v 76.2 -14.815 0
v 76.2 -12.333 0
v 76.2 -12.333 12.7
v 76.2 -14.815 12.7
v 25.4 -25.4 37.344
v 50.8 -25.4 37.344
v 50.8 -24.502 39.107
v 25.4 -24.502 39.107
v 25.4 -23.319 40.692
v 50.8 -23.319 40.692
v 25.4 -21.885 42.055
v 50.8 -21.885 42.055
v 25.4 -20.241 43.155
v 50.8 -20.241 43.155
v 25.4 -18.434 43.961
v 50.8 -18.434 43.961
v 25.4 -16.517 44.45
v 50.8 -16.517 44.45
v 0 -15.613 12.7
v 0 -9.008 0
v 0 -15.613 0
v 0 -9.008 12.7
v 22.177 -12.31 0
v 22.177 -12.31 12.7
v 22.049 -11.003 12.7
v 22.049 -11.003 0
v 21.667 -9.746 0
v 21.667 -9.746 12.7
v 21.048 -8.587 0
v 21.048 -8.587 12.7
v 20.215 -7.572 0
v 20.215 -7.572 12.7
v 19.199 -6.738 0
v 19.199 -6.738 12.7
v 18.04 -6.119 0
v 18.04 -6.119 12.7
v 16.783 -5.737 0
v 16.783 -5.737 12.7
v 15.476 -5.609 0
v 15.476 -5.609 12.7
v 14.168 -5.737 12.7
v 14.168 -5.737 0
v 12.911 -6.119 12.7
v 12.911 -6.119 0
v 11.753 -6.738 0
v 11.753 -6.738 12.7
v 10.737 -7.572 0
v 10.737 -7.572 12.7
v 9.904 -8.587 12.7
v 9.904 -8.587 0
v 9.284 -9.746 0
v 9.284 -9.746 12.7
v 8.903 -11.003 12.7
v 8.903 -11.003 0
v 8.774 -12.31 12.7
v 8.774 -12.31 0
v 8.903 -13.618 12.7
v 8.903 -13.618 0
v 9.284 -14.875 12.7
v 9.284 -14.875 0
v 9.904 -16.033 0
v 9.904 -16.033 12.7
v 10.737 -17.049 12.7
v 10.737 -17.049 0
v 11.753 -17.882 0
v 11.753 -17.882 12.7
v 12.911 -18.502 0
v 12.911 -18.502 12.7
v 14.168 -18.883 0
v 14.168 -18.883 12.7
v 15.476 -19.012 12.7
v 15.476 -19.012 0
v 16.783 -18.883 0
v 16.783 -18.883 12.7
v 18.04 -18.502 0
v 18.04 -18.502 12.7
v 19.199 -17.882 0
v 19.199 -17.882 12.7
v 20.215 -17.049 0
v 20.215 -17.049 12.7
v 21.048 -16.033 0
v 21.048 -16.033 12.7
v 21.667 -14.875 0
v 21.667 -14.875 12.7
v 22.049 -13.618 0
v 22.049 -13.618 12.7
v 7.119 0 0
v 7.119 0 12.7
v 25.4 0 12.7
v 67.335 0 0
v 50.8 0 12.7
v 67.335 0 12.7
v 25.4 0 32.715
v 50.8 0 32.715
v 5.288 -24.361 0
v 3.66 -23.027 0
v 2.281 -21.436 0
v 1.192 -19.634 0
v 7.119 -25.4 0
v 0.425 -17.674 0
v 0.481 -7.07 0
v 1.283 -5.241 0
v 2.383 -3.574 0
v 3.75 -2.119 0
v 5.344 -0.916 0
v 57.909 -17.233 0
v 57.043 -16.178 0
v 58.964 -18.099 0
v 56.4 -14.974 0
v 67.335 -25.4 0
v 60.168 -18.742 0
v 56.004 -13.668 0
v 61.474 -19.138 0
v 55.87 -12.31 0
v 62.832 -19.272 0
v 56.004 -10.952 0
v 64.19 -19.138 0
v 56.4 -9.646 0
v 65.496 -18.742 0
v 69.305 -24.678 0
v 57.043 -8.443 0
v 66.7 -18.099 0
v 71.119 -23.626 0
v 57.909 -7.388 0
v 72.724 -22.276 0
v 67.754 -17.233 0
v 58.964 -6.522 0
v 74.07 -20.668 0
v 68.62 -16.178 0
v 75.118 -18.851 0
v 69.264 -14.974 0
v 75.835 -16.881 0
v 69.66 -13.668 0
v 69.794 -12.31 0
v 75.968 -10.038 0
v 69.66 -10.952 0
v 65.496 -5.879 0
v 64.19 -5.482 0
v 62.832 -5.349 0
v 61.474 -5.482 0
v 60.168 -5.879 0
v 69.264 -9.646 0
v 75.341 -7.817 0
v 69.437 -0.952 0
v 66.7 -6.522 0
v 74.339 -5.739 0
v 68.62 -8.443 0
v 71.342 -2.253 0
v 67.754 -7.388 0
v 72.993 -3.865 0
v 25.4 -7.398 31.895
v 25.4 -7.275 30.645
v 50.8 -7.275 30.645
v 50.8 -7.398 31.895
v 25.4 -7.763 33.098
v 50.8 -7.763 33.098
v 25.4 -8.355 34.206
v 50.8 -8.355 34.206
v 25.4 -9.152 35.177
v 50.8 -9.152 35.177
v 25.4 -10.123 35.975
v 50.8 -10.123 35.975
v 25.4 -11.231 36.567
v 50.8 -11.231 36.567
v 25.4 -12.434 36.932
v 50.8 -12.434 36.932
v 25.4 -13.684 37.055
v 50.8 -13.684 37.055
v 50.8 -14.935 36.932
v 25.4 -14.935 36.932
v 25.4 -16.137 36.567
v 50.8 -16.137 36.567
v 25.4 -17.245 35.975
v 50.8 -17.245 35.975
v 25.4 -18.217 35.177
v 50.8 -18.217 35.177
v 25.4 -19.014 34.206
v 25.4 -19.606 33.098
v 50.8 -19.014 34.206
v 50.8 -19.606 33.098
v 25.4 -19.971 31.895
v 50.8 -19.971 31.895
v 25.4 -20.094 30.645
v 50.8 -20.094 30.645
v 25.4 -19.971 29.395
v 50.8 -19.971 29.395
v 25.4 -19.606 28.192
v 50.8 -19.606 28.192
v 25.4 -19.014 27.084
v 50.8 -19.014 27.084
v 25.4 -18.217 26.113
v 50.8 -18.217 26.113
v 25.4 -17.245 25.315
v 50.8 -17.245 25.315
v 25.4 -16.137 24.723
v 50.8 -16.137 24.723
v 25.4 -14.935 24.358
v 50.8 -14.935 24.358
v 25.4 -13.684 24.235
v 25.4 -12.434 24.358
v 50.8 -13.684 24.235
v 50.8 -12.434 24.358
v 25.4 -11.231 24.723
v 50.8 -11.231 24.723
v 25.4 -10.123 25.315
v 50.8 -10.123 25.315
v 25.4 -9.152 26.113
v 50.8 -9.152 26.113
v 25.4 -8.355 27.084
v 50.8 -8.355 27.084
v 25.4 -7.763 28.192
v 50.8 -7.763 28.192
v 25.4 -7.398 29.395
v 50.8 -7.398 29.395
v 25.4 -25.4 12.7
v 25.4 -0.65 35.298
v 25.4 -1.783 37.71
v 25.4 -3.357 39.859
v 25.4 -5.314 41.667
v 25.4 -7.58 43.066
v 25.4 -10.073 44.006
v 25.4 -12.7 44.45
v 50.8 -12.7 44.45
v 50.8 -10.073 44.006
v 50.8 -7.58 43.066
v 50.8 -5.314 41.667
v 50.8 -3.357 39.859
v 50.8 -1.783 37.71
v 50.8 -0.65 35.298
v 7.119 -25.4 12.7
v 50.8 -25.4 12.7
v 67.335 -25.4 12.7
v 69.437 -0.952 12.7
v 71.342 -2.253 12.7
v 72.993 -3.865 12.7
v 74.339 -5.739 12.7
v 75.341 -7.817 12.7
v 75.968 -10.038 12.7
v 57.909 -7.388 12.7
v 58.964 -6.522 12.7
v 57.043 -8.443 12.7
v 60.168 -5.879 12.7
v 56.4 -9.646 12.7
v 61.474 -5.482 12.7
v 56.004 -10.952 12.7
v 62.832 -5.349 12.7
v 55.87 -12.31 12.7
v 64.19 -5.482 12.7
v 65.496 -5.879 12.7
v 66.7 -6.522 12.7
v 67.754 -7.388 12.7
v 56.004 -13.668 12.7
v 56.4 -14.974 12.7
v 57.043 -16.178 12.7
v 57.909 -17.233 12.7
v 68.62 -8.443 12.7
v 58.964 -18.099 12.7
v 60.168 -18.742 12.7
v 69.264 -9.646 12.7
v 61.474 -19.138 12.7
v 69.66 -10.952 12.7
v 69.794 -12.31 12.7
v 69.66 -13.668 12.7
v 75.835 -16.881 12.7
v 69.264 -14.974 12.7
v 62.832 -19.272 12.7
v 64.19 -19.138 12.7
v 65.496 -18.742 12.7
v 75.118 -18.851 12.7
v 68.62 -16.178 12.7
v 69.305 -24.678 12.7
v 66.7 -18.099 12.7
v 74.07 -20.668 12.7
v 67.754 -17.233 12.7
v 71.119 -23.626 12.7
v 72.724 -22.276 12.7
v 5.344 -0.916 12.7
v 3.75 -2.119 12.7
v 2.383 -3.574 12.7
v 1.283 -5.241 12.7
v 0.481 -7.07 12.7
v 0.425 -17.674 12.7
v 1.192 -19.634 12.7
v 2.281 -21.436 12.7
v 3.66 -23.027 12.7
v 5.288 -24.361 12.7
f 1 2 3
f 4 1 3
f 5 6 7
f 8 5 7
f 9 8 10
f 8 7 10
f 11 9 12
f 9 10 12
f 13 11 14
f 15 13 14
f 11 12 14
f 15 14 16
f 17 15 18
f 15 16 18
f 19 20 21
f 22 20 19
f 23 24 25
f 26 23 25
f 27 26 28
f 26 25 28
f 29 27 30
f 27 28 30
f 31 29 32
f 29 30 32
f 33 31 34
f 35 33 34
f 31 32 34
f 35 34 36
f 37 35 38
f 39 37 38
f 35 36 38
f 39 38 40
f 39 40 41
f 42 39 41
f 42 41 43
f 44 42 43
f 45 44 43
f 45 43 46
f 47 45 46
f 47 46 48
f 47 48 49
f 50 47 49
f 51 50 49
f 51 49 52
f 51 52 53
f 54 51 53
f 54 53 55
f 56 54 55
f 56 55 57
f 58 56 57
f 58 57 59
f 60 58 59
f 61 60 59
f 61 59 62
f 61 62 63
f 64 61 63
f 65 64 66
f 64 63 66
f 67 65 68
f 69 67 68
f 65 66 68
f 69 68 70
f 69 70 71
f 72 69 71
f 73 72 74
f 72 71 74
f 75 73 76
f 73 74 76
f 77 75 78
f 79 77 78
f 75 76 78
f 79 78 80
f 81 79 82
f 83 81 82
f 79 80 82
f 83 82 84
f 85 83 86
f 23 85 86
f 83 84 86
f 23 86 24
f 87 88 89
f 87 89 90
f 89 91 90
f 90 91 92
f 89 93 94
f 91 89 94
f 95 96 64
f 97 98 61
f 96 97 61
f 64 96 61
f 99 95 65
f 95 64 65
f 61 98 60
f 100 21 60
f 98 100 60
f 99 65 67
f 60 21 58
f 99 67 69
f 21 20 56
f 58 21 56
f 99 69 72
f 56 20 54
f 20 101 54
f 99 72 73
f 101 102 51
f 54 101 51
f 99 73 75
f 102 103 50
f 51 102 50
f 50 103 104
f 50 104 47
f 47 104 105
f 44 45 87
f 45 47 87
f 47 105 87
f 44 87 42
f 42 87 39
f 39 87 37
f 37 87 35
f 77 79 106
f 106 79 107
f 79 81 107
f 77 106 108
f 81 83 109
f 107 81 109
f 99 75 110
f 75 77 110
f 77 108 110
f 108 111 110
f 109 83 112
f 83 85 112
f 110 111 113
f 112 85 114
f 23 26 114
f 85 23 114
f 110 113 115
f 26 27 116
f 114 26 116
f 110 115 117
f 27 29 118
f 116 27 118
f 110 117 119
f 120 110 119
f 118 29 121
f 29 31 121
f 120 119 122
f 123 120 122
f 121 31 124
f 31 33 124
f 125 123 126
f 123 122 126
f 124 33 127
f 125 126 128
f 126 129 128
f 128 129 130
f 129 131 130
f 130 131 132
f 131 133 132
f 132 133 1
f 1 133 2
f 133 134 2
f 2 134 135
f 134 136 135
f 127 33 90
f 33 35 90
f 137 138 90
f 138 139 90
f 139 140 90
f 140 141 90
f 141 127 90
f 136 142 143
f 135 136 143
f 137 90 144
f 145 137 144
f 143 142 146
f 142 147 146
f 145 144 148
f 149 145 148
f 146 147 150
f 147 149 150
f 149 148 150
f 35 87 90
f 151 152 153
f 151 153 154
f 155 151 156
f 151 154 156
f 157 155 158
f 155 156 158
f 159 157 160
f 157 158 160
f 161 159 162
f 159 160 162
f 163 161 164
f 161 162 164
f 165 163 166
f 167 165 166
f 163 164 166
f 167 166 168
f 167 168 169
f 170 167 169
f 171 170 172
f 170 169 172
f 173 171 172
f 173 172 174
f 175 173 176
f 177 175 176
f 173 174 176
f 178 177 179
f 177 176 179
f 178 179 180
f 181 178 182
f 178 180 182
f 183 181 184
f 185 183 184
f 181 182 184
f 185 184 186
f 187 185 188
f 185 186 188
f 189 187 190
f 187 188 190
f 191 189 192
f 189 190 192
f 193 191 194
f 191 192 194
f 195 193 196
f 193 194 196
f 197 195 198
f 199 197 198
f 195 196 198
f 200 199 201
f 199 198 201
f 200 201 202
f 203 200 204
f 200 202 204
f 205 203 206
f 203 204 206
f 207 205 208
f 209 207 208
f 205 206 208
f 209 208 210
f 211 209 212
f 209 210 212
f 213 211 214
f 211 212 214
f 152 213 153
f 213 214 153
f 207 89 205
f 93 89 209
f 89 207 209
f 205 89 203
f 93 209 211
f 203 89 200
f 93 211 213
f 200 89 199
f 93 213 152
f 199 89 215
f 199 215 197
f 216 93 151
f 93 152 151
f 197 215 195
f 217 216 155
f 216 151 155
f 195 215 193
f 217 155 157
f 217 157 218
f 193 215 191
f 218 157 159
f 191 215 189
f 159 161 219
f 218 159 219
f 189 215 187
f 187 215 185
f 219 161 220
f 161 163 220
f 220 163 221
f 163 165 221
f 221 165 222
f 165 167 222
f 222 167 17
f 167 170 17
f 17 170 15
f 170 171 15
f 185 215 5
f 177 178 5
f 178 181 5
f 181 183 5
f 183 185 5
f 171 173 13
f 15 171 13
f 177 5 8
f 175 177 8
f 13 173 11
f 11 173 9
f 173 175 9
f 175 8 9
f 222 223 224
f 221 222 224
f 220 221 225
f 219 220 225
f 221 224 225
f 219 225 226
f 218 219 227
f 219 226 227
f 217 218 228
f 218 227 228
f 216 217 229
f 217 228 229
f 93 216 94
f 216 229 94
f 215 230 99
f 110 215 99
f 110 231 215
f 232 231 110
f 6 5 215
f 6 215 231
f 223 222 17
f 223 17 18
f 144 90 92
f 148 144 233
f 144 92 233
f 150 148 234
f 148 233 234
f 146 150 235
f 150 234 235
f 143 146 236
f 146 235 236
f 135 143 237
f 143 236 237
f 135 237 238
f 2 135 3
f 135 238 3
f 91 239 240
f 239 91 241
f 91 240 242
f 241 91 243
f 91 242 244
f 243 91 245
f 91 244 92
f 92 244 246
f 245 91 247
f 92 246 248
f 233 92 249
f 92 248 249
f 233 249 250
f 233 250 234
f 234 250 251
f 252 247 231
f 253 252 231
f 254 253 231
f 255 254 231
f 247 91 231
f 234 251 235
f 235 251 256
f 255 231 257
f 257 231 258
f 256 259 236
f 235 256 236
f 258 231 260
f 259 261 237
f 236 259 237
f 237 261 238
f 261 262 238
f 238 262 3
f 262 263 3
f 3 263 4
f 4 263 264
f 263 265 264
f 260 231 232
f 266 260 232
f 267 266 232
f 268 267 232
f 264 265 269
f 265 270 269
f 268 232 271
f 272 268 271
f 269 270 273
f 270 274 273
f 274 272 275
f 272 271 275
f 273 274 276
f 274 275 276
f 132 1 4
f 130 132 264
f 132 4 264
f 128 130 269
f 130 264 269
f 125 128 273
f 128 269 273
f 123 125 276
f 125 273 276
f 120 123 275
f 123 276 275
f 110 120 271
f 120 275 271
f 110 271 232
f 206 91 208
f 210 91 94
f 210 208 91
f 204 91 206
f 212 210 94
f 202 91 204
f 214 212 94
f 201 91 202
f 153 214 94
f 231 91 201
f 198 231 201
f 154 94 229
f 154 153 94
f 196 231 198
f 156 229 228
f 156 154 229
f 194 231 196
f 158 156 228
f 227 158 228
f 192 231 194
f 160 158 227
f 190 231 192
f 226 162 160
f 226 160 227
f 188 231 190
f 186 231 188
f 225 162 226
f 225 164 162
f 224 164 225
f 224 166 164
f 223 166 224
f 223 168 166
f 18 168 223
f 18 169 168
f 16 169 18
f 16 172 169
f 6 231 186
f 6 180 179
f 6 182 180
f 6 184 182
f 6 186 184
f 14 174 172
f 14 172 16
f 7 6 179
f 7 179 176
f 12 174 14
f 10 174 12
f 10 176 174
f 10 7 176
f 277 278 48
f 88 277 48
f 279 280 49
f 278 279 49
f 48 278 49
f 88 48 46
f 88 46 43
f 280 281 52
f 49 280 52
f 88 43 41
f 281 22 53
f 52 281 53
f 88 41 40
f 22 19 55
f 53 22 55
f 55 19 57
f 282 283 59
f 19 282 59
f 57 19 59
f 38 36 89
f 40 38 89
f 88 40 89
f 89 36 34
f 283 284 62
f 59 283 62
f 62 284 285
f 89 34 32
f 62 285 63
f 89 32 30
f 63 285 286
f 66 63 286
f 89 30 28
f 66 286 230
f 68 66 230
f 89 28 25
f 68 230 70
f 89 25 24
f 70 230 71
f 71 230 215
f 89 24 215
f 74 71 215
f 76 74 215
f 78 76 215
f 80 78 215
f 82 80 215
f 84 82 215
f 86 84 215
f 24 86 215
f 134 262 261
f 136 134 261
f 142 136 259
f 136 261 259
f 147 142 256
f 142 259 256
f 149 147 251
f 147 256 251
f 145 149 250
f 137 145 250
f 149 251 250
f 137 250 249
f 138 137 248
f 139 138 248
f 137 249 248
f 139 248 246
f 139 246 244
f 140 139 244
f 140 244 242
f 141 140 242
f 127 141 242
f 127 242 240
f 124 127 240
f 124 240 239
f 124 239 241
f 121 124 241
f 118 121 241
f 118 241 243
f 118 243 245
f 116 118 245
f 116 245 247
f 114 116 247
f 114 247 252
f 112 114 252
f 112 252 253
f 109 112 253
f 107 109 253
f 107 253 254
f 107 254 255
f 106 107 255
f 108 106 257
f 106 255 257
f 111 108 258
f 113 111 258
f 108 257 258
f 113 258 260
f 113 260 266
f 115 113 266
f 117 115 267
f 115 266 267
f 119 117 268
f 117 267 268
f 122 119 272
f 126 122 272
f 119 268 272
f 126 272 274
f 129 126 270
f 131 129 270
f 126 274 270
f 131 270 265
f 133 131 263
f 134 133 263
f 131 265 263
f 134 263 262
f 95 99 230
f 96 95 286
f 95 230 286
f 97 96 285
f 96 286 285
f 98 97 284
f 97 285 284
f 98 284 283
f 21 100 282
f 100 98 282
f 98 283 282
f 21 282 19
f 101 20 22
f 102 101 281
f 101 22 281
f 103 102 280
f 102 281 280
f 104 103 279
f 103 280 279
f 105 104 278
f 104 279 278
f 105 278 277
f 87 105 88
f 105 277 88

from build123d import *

# Parameters (mm, degrees)
F0_W      = 76.2
F0_H      = 44.45
F1_DEPTH  = 25.4
F2_W      = 25.4
F2_H      = 31.75
F3_DEPTH  = 25.4
F5_DEPTH  = 25.4
F6_R      = 6.4097616639
F7_DEPTH  = 25.4
F9_DEPTH  = 25.4
F11_DEPTH = 25.4
F12_R     = 6.9616762065
F12_R_2   = 6.701591824
F13_DEPTH = 25.4


with BuildPart() as f1:
    # F0 (on Front) → F1 (new body)
    with BuildSketch(Plane.XZ):
        with Locations((38.1, 22.225)):
            Rectangle(F0_W, F0_H)
    extrude(amount=F1_DEPTH)

    # F2 (on face) → F3 (cut)
    with BuildSketch(Plane.XZ.offset(25.4)):
        with Locations((12.7, 28.575)):
            Rectangle(F2_W, F2_H)
        with Locations((63.5, 28.575)):
            Rectangle(F2_W, F2_H)
    extrude(amount=-F3_DEPTH, mode=Mode.SUBTRACT)

    # F4 (on face) → F5 (cut)
    with BuildSketch(Plane.YZ.offset(50.8)):
        with BuildLine():
            ThreePointArc((-25.4, 37.343819084), (-21.8851025395, 42.054991557), (-16.517273855, 44.45))
            Line((-16.517273855, 44.45), (-25.4, 44.45))
            Line((-25.4, 44.45), (-25.4, 37.343819084))
        make_face()
        with BuildLine():
            Line((0, 44.45), (-12.7, 44.45))
            ThreePointArc((-12.7, 44.45), (-4.2917980427, 40.8099765707), (0, 32.7150336876))
            Line((0, 32.7150336876), (0, 44.45))
        make_face()
    extrude(amount=-F5_DEPTH, mode=Mode.SUBTRACT)

    # F6 (on face) → F7 (cut)
    with BuildSketch(Plane.YZ.offset(50.8)):
        with Locations((-13.6843539452, 30.6450168438)):
            Circle(F6_R)
    extrude(amount=-F7_DEPTH, mode=Mode.SUBTRACT)

    # F8 (on face) → F9 (cut)
    with BuildSketch(Plane.XY.offset(12.7)):
        with BuildLine():
            Line((0, 0), (0, -9.0078908736))
            ThreePointArc((0, -9.0078908736), (2.3832082238, -3.5743776274), (7.1188784204, 0))
            Line((7.1188784204, 0), (0, 0))
        make_face()
        with BuildLine():
            ThreePointArc((7.1188784204, -25.4), (2.2814327848, -21.4359106329), (0, -15.612685647))
            Line((0, -15.612685647), (0, -25.4))
            Line((0, -25.4), (7.1188784204, -25.4))
        make_face()
    extrude(amount=-F9_DEPTH, mode=Mode.SUBTRACT)

    # F10 (on face) → F11 (cut)
    with BuildSketch(Plane.XY.offset(12.7)):
        with BuildLine():
            ThreePointArc((67.3354417086, 0), (73.7069873412, -4.7726544119), (76.2, -12.3330586186))
            Line((76.2, -12.3330586186), (76.2, 0))
            Line((76.2, 0), (67.3354417086, 0))
        make_face()
        with BuildLine():
            ThreePointArc((76.2, -14.8152652197), (73.4320785831, -21.5015075072), (67.3354417086, -25.4))
            Line((67.3354417086, -25.4), (76.2, -25.4))
            Line((76.2, -25.4), (76.2, -14.8152652197))
        make_face()
    extrude(amount=-F11_DEPTH, mode=Mode.SUBTRACT)

    # F12 (on face) → F13 (cut)
    with BuildSketch(Plane.XY.offset(12.7)):
        with Locations((62.8318414092, -12.3102882603)):
            Circle(F12_R)
        with Locations((15.475823544, -12.3102882603)):
            Circle(F12_R_2)
    extrude(amount=-F13_DEPTH, mode=Mode.SUBTRACT)


solid = f1.part
